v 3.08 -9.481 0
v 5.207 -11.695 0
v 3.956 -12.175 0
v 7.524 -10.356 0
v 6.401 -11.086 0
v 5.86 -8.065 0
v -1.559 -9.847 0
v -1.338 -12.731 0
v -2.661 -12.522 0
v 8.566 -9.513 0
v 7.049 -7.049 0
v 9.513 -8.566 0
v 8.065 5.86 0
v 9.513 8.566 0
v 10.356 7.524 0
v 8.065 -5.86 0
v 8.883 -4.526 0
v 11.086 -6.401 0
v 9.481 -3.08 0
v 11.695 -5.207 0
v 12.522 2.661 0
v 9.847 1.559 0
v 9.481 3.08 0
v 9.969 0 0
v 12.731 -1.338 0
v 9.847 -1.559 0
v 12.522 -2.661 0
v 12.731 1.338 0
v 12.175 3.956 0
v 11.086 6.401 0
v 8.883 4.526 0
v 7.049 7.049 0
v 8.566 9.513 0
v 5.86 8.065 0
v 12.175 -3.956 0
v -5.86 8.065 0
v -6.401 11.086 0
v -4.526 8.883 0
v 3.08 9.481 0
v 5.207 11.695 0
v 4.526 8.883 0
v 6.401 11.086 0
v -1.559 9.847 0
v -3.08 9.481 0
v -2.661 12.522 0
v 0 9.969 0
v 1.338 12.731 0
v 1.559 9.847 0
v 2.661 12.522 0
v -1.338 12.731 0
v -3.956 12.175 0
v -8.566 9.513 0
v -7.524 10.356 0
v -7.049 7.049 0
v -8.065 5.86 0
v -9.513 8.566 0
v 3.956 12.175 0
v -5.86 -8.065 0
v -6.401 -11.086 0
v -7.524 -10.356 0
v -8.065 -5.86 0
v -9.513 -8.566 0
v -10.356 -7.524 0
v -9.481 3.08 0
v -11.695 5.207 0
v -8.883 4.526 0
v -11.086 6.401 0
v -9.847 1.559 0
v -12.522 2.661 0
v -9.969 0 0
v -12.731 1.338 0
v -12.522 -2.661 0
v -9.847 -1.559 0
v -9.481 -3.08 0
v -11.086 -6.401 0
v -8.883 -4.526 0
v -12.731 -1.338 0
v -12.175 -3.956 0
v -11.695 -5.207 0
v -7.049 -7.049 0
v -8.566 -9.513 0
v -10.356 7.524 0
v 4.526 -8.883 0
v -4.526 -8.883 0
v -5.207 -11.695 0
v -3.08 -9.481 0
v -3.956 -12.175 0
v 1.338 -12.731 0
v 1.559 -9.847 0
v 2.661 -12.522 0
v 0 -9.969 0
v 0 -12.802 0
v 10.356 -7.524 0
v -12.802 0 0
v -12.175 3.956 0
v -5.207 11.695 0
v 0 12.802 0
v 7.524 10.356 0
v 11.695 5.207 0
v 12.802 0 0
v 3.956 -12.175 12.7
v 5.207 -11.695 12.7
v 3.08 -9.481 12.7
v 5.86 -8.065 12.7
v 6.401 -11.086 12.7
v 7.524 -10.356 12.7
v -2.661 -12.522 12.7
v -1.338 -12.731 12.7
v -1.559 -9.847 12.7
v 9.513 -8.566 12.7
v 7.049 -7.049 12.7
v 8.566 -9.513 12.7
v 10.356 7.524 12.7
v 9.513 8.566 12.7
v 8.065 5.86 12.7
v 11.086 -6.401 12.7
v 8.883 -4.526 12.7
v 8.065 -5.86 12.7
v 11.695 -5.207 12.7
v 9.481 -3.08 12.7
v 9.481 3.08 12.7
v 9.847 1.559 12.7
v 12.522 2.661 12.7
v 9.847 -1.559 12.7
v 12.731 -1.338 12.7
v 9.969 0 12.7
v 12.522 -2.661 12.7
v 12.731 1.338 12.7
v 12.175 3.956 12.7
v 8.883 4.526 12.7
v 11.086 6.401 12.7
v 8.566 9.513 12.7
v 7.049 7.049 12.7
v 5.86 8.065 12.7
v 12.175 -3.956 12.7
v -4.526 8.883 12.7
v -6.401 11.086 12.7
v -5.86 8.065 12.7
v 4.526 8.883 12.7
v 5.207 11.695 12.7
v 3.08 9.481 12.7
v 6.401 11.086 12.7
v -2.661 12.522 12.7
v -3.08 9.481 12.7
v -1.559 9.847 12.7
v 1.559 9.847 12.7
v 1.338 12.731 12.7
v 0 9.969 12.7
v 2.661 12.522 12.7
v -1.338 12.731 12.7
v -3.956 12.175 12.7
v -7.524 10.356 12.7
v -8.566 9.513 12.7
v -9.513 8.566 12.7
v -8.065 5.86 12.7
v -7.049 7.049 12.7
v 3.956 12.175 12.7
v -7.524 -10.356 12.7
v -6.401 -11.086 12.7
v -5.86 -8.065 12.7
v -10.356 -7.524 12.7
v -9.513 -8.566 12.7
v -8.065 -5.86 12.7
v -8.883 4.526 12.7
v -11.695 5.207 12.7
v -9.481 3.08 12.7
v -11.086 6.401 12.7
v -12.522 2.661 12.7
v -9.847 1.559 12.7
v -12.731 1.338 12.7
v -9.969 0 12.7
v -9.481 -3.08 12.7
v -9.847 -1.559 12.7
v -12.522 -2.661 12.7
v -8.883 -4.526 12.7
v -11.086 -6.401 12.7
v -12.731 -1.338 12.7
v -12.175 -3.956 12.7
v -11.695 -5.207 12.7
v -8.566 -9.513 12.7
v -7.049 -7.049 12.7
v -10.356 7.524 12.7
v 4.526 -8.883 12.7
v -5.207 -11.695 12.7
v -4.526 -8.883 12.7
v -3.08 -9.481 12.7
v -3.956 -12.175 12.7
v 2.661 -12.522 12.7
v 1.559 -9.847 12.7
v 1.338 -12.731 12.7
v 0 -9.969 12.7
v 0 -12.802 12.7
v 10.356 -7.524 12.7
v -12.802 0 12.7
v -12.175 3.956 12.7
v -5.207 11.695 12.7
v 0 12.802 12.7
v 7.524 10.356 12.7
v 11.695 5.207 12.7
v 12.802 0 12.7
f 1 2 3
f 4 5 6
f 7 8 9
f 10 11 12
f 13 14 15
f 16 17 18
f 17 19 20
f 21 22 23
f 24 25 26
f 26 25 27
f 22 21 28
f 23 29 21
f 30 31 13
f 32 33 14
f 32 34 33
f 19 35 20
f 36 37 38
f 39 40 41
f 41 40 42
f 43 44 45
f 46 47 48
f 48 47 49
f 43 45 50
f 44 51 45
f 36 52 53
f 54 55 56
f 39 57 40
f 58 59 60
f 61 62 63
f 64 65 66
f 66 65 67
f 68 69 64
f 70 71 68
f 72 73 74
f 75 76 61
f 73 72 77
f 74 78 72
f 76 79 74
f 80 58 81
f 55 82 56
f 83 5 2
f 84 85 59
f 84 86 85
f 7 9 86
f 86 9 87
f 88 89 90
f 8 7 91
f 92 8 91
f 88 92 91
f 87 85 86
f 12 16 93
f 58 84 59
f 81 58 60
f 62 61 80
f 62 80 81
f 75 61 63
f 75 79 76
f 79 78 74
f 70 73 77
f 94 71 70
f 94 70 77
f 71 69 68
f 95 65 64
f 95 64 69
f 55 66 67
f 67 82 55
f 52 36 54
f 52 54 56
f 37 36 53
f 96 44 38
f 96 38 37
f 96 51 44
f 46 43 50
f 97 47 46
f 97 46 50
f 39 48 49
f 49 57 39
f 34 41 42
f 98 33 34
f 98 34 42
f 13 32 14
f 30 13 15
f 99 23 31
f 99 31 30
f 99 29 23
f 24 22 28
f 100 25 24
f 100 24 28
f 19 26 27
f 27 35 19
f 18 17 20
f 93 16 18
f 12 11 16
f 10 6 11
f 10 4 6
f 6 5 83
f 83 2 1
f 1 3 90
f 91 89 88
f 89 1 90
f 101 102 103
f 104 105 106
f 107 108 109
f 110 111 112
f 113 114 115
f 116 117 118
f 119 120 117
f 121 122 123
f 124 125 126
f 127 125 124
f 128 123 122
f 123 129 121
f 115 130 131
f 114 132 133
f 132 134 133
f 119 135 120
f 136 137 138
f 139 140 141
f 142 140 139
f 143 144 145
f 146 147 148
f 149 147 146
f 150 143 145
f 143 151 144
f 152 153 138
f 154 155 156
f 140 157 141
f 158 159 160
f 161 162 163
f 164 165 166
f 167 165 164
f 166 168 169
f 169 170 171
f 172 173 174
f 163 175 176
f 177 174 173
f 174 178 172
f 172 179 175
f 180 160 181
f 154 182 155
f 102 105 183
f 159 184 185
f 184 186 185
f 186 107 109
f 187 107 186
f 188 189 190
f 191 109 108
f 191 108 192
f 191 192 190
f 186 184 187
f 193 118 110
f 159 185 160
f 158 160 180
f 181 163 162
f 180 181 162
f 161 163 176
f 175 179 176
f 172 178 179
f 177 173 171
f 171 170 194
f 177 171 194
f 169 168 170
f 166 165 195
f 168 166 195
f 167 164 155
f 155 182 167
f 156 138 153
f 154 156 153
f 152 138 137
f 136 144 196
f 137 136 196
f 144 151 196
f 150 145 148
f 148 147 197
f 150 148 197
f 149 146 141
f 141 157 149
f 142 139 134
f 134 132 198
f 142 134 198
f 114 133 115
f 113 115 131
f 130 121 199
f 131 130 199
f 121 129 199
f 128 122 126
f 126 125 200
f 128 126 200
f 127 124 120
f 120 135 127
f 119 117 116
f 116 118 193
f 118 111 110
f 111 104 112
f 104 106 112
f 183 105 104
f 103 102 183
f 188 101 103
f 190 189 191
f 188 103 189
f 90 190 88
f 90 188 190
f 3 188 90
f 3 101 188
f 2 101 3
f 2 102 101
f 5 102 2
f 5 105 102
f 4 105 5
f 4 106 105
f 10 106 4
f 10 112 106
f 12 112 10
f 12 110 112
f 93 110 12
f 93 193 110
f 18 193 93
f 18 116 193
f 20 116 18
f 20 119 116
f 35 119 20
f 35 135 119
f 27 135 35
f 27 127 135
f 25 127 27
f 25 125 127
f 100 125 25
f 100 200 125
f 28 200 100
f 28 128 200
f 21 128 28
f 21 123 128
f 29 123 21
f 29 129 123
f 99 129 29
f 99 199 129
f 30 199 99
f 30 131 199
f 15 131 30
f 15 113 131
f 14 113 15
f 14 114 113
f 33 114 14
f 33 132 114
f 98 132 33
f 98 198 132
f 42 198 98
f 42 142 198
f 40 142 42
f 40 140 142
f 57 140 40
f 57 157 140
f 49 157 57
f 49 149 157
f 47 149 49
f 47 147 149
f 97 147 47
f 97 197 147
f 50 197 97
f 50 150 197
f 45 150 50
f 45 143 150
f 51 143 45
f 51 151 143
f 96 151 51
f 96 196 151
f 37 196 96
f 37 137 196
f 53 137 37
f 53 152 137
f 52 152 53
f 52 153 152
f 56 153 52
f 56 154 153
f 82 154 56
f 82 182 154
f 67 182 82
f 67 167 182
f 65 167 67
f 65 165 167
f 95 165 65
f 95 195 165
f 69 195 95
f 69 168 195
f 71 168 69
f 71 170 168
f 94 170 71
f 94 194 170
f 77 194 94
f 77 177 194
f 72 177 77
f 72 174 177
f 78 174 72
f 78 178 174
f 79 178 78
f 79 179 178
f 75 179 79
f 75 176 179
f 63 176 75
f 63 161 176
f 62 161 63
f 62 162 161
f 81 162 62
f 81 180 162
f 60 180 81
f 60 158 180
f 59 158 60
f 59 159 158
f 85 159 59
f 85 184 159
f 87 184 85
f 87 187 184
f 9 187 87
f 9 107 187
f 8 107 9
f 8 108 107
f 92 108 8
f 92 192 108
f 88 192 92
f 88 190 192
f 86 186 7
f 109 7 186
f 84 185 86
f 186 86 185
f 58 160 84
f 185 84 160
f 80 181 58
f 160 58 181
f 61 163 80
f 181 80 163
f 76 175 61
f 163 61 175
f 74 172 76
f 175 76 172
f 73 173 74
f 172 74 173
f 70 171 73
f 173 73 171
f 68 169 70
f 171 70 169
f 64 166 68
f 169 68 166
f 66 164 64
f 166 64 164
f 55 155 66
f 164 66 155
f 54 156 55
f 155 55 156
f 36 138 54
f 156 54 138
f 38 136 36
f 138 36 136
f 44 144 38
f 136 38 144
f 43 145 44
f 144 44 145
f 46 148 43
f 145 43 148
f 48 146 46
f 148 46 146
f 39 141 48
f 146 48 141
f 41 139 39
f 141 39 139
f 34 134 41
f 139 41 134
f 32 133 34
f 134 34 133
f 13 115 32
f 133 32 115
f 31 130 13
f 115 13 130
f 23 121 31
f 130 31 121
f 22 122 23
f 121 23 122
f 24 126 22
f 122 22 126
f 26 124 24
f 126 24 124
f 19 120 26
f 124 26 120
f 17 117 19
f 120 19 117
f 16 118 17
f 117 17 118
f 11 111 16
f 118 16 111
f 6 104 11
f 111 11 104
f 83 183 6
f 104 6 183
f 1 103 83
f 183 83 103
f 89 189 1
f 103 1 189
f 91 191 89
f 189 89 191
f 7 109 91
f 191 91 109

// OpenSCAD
// file: Rod.scad
RodDiameter       = 1;
RodRadius         = 2;
RodClearanceSnug  = 3;
RodClearanceLoose = 4;
RodFn             = 5;

RodOneEighthInch = [
  [RodDiameter, 1/8],
  [RodRadius, 1/8/2],
  [RodClearanceSnug, 0.02],
  [RodClearanceLoose, 0.03],
  [RodFn, 16]
];

RodOneQuarterInch = [
  [RodDiameter,       1/4],
  [RodRadius,         1/4/2],
  [RodClearanceSnug,  0.027],
  [RodClearanceLoose, 0.035],
  [RodFn,             20]
];

RodThreeQuarterInchTubing = [
  [RodDiameter,       0.758],
  [RodRadius,         0.758/2],
  [RodClearanceSnug,  0.023],
  [RodClearanceLoose, 0.027],
  [RodFn,             40]
];

module Rod2d(rod=RodOneQuarterInch, clearance=undef, center=false, $fn=undef) {
  clearRadius = clearance != undef ? lookup(clearance, rod)/2 : 0;

  circle(r=lookup(RodDiameter, rod)/2 + clearRadius,
         center=center,
         $fn=$fn == undef ? lookup(RodFn, rod) : $fn);
}


module Rod(rod=RodOneQuarterInch, length=1, clearance=undef, center=false, $fn=undef) {
  clearRadius = clearance != undef ? lookup(clearance, rod)/2 : 0;

  cylinder(r=lookup(RodDiameter, rod)/2 + clearRadius,
           h=length,
           center=center,
           $fn=$fn == undef ? lookup(RodFn, rod) : $fn);
}

// 1/8" Rod
1_8_rod_d                = 1/8;
1_8_rod_r                = 1_8_rod_d/2;
1_8_rod_clearance        = 0.02;
1_8_rod_clearance_loose  = 0.03;

// 1/4" Rod
1_4_rod_d                = 1/4;
1_4_rod_r                = 1_4_rod_d/2;
1_4_rod_clearance        = 0.01;
1_4_rod_clearance_loose  = 0.015;
1_4_rod_collar_d         = 1/22;
1_4_rod_collar_width     = 0.27;
1_4_rod_collar_clearance = 0.0; // TODO

// 5/16" Rod
5_16_rod_d                = 5/16;
5_16_rod_r                = 5_16_rod_d/2;
5_16_rod_clearance        = 0.02; // TODO
5_16_rod_clearance_loose  = 0.02;

module rod(diameter=1, length=1, clearance=0, clearance_loose=0, loose=false, cutter=false, center=false, $fn=20) {
  clearance = loose ? clearance_loose : clearance;

  if (cutter) {
    cylinder(r=(diameter/2) + (loose ? clearance_loose : clearance), h=length, center=center);
  } else {
    cylinder(r=diameter/2, h=length, center=center);
  }
}

module 1_8_rod(length=1, loose=false, cutter=false, center=false) {
  rod(diameter=1_8_rod_d,
      clearance=1_8_rod_clearance,
      clearance_loose=1_8_rod_clearance_loose,
      length=length,
      cutter=cutter,
      center=center);
}

module 1_4_rod(length=1, loose=false, cutter=false, center=false) {
  rod(diameter=1_4_rod_d,
      clearance=1_4_rod_clearance,
      clearance_loose=1_4_rod_clearance_loose,
      loose=loose,
      length=length,
      cutter=cutter,
      center=center);
}

module 1_4_rod_collar(cutter=false) {
  rod(diameter=1_4_rod_collar_d,
      clearance=1_4_rod_collar_clearance,
      cutter=cutter,
      length=1_4_rod_collar_width);
}

module 5_16_rod(length=1, loose=false, cutter=false, center=false) {
  rod(diameter=5_16_rod_d,
      clearance=5_16_rod_clearance,
      clearance_loose=5_16_rod_clearance_loose,
      length=length,
      cutter=cutter,
      center=center);
}
// main file
include <Rod.scad>;

$fn=60;

module RodCalibration(rod, clearance, wall=1/8, height=1/2) {
  linear_extrude(height=height)
  difference() {
    circle(r=lookup(RodRadius, rod) + wall);
    Rod2d(rod=rod, clearance=clearance);
  }
}


scale([25.4,25.4,25.4]) {

  // 1/8" Rod
  *translate([-1,0,0])
  difference() {
    cylinder(r=1/4, h=1/4);
    1_8_rod(cutter=true);
  }

  // 1/4" Rod
  *difference() {
    cylinder(r=1/4, h=1/4);
    1_4_rod(cutter=true);
  }

  // 5/16" Rod
  *translate([1,0,0])
  difference() {
    cylinder(r=1/4, h=1/4);
    5_16_rod(cutter=true);
  }

  // 3/4" Tubing
  RodCalibration(rod=RodThreeQuarterInchTubing, clearance=RodClearanceLoose);

}
